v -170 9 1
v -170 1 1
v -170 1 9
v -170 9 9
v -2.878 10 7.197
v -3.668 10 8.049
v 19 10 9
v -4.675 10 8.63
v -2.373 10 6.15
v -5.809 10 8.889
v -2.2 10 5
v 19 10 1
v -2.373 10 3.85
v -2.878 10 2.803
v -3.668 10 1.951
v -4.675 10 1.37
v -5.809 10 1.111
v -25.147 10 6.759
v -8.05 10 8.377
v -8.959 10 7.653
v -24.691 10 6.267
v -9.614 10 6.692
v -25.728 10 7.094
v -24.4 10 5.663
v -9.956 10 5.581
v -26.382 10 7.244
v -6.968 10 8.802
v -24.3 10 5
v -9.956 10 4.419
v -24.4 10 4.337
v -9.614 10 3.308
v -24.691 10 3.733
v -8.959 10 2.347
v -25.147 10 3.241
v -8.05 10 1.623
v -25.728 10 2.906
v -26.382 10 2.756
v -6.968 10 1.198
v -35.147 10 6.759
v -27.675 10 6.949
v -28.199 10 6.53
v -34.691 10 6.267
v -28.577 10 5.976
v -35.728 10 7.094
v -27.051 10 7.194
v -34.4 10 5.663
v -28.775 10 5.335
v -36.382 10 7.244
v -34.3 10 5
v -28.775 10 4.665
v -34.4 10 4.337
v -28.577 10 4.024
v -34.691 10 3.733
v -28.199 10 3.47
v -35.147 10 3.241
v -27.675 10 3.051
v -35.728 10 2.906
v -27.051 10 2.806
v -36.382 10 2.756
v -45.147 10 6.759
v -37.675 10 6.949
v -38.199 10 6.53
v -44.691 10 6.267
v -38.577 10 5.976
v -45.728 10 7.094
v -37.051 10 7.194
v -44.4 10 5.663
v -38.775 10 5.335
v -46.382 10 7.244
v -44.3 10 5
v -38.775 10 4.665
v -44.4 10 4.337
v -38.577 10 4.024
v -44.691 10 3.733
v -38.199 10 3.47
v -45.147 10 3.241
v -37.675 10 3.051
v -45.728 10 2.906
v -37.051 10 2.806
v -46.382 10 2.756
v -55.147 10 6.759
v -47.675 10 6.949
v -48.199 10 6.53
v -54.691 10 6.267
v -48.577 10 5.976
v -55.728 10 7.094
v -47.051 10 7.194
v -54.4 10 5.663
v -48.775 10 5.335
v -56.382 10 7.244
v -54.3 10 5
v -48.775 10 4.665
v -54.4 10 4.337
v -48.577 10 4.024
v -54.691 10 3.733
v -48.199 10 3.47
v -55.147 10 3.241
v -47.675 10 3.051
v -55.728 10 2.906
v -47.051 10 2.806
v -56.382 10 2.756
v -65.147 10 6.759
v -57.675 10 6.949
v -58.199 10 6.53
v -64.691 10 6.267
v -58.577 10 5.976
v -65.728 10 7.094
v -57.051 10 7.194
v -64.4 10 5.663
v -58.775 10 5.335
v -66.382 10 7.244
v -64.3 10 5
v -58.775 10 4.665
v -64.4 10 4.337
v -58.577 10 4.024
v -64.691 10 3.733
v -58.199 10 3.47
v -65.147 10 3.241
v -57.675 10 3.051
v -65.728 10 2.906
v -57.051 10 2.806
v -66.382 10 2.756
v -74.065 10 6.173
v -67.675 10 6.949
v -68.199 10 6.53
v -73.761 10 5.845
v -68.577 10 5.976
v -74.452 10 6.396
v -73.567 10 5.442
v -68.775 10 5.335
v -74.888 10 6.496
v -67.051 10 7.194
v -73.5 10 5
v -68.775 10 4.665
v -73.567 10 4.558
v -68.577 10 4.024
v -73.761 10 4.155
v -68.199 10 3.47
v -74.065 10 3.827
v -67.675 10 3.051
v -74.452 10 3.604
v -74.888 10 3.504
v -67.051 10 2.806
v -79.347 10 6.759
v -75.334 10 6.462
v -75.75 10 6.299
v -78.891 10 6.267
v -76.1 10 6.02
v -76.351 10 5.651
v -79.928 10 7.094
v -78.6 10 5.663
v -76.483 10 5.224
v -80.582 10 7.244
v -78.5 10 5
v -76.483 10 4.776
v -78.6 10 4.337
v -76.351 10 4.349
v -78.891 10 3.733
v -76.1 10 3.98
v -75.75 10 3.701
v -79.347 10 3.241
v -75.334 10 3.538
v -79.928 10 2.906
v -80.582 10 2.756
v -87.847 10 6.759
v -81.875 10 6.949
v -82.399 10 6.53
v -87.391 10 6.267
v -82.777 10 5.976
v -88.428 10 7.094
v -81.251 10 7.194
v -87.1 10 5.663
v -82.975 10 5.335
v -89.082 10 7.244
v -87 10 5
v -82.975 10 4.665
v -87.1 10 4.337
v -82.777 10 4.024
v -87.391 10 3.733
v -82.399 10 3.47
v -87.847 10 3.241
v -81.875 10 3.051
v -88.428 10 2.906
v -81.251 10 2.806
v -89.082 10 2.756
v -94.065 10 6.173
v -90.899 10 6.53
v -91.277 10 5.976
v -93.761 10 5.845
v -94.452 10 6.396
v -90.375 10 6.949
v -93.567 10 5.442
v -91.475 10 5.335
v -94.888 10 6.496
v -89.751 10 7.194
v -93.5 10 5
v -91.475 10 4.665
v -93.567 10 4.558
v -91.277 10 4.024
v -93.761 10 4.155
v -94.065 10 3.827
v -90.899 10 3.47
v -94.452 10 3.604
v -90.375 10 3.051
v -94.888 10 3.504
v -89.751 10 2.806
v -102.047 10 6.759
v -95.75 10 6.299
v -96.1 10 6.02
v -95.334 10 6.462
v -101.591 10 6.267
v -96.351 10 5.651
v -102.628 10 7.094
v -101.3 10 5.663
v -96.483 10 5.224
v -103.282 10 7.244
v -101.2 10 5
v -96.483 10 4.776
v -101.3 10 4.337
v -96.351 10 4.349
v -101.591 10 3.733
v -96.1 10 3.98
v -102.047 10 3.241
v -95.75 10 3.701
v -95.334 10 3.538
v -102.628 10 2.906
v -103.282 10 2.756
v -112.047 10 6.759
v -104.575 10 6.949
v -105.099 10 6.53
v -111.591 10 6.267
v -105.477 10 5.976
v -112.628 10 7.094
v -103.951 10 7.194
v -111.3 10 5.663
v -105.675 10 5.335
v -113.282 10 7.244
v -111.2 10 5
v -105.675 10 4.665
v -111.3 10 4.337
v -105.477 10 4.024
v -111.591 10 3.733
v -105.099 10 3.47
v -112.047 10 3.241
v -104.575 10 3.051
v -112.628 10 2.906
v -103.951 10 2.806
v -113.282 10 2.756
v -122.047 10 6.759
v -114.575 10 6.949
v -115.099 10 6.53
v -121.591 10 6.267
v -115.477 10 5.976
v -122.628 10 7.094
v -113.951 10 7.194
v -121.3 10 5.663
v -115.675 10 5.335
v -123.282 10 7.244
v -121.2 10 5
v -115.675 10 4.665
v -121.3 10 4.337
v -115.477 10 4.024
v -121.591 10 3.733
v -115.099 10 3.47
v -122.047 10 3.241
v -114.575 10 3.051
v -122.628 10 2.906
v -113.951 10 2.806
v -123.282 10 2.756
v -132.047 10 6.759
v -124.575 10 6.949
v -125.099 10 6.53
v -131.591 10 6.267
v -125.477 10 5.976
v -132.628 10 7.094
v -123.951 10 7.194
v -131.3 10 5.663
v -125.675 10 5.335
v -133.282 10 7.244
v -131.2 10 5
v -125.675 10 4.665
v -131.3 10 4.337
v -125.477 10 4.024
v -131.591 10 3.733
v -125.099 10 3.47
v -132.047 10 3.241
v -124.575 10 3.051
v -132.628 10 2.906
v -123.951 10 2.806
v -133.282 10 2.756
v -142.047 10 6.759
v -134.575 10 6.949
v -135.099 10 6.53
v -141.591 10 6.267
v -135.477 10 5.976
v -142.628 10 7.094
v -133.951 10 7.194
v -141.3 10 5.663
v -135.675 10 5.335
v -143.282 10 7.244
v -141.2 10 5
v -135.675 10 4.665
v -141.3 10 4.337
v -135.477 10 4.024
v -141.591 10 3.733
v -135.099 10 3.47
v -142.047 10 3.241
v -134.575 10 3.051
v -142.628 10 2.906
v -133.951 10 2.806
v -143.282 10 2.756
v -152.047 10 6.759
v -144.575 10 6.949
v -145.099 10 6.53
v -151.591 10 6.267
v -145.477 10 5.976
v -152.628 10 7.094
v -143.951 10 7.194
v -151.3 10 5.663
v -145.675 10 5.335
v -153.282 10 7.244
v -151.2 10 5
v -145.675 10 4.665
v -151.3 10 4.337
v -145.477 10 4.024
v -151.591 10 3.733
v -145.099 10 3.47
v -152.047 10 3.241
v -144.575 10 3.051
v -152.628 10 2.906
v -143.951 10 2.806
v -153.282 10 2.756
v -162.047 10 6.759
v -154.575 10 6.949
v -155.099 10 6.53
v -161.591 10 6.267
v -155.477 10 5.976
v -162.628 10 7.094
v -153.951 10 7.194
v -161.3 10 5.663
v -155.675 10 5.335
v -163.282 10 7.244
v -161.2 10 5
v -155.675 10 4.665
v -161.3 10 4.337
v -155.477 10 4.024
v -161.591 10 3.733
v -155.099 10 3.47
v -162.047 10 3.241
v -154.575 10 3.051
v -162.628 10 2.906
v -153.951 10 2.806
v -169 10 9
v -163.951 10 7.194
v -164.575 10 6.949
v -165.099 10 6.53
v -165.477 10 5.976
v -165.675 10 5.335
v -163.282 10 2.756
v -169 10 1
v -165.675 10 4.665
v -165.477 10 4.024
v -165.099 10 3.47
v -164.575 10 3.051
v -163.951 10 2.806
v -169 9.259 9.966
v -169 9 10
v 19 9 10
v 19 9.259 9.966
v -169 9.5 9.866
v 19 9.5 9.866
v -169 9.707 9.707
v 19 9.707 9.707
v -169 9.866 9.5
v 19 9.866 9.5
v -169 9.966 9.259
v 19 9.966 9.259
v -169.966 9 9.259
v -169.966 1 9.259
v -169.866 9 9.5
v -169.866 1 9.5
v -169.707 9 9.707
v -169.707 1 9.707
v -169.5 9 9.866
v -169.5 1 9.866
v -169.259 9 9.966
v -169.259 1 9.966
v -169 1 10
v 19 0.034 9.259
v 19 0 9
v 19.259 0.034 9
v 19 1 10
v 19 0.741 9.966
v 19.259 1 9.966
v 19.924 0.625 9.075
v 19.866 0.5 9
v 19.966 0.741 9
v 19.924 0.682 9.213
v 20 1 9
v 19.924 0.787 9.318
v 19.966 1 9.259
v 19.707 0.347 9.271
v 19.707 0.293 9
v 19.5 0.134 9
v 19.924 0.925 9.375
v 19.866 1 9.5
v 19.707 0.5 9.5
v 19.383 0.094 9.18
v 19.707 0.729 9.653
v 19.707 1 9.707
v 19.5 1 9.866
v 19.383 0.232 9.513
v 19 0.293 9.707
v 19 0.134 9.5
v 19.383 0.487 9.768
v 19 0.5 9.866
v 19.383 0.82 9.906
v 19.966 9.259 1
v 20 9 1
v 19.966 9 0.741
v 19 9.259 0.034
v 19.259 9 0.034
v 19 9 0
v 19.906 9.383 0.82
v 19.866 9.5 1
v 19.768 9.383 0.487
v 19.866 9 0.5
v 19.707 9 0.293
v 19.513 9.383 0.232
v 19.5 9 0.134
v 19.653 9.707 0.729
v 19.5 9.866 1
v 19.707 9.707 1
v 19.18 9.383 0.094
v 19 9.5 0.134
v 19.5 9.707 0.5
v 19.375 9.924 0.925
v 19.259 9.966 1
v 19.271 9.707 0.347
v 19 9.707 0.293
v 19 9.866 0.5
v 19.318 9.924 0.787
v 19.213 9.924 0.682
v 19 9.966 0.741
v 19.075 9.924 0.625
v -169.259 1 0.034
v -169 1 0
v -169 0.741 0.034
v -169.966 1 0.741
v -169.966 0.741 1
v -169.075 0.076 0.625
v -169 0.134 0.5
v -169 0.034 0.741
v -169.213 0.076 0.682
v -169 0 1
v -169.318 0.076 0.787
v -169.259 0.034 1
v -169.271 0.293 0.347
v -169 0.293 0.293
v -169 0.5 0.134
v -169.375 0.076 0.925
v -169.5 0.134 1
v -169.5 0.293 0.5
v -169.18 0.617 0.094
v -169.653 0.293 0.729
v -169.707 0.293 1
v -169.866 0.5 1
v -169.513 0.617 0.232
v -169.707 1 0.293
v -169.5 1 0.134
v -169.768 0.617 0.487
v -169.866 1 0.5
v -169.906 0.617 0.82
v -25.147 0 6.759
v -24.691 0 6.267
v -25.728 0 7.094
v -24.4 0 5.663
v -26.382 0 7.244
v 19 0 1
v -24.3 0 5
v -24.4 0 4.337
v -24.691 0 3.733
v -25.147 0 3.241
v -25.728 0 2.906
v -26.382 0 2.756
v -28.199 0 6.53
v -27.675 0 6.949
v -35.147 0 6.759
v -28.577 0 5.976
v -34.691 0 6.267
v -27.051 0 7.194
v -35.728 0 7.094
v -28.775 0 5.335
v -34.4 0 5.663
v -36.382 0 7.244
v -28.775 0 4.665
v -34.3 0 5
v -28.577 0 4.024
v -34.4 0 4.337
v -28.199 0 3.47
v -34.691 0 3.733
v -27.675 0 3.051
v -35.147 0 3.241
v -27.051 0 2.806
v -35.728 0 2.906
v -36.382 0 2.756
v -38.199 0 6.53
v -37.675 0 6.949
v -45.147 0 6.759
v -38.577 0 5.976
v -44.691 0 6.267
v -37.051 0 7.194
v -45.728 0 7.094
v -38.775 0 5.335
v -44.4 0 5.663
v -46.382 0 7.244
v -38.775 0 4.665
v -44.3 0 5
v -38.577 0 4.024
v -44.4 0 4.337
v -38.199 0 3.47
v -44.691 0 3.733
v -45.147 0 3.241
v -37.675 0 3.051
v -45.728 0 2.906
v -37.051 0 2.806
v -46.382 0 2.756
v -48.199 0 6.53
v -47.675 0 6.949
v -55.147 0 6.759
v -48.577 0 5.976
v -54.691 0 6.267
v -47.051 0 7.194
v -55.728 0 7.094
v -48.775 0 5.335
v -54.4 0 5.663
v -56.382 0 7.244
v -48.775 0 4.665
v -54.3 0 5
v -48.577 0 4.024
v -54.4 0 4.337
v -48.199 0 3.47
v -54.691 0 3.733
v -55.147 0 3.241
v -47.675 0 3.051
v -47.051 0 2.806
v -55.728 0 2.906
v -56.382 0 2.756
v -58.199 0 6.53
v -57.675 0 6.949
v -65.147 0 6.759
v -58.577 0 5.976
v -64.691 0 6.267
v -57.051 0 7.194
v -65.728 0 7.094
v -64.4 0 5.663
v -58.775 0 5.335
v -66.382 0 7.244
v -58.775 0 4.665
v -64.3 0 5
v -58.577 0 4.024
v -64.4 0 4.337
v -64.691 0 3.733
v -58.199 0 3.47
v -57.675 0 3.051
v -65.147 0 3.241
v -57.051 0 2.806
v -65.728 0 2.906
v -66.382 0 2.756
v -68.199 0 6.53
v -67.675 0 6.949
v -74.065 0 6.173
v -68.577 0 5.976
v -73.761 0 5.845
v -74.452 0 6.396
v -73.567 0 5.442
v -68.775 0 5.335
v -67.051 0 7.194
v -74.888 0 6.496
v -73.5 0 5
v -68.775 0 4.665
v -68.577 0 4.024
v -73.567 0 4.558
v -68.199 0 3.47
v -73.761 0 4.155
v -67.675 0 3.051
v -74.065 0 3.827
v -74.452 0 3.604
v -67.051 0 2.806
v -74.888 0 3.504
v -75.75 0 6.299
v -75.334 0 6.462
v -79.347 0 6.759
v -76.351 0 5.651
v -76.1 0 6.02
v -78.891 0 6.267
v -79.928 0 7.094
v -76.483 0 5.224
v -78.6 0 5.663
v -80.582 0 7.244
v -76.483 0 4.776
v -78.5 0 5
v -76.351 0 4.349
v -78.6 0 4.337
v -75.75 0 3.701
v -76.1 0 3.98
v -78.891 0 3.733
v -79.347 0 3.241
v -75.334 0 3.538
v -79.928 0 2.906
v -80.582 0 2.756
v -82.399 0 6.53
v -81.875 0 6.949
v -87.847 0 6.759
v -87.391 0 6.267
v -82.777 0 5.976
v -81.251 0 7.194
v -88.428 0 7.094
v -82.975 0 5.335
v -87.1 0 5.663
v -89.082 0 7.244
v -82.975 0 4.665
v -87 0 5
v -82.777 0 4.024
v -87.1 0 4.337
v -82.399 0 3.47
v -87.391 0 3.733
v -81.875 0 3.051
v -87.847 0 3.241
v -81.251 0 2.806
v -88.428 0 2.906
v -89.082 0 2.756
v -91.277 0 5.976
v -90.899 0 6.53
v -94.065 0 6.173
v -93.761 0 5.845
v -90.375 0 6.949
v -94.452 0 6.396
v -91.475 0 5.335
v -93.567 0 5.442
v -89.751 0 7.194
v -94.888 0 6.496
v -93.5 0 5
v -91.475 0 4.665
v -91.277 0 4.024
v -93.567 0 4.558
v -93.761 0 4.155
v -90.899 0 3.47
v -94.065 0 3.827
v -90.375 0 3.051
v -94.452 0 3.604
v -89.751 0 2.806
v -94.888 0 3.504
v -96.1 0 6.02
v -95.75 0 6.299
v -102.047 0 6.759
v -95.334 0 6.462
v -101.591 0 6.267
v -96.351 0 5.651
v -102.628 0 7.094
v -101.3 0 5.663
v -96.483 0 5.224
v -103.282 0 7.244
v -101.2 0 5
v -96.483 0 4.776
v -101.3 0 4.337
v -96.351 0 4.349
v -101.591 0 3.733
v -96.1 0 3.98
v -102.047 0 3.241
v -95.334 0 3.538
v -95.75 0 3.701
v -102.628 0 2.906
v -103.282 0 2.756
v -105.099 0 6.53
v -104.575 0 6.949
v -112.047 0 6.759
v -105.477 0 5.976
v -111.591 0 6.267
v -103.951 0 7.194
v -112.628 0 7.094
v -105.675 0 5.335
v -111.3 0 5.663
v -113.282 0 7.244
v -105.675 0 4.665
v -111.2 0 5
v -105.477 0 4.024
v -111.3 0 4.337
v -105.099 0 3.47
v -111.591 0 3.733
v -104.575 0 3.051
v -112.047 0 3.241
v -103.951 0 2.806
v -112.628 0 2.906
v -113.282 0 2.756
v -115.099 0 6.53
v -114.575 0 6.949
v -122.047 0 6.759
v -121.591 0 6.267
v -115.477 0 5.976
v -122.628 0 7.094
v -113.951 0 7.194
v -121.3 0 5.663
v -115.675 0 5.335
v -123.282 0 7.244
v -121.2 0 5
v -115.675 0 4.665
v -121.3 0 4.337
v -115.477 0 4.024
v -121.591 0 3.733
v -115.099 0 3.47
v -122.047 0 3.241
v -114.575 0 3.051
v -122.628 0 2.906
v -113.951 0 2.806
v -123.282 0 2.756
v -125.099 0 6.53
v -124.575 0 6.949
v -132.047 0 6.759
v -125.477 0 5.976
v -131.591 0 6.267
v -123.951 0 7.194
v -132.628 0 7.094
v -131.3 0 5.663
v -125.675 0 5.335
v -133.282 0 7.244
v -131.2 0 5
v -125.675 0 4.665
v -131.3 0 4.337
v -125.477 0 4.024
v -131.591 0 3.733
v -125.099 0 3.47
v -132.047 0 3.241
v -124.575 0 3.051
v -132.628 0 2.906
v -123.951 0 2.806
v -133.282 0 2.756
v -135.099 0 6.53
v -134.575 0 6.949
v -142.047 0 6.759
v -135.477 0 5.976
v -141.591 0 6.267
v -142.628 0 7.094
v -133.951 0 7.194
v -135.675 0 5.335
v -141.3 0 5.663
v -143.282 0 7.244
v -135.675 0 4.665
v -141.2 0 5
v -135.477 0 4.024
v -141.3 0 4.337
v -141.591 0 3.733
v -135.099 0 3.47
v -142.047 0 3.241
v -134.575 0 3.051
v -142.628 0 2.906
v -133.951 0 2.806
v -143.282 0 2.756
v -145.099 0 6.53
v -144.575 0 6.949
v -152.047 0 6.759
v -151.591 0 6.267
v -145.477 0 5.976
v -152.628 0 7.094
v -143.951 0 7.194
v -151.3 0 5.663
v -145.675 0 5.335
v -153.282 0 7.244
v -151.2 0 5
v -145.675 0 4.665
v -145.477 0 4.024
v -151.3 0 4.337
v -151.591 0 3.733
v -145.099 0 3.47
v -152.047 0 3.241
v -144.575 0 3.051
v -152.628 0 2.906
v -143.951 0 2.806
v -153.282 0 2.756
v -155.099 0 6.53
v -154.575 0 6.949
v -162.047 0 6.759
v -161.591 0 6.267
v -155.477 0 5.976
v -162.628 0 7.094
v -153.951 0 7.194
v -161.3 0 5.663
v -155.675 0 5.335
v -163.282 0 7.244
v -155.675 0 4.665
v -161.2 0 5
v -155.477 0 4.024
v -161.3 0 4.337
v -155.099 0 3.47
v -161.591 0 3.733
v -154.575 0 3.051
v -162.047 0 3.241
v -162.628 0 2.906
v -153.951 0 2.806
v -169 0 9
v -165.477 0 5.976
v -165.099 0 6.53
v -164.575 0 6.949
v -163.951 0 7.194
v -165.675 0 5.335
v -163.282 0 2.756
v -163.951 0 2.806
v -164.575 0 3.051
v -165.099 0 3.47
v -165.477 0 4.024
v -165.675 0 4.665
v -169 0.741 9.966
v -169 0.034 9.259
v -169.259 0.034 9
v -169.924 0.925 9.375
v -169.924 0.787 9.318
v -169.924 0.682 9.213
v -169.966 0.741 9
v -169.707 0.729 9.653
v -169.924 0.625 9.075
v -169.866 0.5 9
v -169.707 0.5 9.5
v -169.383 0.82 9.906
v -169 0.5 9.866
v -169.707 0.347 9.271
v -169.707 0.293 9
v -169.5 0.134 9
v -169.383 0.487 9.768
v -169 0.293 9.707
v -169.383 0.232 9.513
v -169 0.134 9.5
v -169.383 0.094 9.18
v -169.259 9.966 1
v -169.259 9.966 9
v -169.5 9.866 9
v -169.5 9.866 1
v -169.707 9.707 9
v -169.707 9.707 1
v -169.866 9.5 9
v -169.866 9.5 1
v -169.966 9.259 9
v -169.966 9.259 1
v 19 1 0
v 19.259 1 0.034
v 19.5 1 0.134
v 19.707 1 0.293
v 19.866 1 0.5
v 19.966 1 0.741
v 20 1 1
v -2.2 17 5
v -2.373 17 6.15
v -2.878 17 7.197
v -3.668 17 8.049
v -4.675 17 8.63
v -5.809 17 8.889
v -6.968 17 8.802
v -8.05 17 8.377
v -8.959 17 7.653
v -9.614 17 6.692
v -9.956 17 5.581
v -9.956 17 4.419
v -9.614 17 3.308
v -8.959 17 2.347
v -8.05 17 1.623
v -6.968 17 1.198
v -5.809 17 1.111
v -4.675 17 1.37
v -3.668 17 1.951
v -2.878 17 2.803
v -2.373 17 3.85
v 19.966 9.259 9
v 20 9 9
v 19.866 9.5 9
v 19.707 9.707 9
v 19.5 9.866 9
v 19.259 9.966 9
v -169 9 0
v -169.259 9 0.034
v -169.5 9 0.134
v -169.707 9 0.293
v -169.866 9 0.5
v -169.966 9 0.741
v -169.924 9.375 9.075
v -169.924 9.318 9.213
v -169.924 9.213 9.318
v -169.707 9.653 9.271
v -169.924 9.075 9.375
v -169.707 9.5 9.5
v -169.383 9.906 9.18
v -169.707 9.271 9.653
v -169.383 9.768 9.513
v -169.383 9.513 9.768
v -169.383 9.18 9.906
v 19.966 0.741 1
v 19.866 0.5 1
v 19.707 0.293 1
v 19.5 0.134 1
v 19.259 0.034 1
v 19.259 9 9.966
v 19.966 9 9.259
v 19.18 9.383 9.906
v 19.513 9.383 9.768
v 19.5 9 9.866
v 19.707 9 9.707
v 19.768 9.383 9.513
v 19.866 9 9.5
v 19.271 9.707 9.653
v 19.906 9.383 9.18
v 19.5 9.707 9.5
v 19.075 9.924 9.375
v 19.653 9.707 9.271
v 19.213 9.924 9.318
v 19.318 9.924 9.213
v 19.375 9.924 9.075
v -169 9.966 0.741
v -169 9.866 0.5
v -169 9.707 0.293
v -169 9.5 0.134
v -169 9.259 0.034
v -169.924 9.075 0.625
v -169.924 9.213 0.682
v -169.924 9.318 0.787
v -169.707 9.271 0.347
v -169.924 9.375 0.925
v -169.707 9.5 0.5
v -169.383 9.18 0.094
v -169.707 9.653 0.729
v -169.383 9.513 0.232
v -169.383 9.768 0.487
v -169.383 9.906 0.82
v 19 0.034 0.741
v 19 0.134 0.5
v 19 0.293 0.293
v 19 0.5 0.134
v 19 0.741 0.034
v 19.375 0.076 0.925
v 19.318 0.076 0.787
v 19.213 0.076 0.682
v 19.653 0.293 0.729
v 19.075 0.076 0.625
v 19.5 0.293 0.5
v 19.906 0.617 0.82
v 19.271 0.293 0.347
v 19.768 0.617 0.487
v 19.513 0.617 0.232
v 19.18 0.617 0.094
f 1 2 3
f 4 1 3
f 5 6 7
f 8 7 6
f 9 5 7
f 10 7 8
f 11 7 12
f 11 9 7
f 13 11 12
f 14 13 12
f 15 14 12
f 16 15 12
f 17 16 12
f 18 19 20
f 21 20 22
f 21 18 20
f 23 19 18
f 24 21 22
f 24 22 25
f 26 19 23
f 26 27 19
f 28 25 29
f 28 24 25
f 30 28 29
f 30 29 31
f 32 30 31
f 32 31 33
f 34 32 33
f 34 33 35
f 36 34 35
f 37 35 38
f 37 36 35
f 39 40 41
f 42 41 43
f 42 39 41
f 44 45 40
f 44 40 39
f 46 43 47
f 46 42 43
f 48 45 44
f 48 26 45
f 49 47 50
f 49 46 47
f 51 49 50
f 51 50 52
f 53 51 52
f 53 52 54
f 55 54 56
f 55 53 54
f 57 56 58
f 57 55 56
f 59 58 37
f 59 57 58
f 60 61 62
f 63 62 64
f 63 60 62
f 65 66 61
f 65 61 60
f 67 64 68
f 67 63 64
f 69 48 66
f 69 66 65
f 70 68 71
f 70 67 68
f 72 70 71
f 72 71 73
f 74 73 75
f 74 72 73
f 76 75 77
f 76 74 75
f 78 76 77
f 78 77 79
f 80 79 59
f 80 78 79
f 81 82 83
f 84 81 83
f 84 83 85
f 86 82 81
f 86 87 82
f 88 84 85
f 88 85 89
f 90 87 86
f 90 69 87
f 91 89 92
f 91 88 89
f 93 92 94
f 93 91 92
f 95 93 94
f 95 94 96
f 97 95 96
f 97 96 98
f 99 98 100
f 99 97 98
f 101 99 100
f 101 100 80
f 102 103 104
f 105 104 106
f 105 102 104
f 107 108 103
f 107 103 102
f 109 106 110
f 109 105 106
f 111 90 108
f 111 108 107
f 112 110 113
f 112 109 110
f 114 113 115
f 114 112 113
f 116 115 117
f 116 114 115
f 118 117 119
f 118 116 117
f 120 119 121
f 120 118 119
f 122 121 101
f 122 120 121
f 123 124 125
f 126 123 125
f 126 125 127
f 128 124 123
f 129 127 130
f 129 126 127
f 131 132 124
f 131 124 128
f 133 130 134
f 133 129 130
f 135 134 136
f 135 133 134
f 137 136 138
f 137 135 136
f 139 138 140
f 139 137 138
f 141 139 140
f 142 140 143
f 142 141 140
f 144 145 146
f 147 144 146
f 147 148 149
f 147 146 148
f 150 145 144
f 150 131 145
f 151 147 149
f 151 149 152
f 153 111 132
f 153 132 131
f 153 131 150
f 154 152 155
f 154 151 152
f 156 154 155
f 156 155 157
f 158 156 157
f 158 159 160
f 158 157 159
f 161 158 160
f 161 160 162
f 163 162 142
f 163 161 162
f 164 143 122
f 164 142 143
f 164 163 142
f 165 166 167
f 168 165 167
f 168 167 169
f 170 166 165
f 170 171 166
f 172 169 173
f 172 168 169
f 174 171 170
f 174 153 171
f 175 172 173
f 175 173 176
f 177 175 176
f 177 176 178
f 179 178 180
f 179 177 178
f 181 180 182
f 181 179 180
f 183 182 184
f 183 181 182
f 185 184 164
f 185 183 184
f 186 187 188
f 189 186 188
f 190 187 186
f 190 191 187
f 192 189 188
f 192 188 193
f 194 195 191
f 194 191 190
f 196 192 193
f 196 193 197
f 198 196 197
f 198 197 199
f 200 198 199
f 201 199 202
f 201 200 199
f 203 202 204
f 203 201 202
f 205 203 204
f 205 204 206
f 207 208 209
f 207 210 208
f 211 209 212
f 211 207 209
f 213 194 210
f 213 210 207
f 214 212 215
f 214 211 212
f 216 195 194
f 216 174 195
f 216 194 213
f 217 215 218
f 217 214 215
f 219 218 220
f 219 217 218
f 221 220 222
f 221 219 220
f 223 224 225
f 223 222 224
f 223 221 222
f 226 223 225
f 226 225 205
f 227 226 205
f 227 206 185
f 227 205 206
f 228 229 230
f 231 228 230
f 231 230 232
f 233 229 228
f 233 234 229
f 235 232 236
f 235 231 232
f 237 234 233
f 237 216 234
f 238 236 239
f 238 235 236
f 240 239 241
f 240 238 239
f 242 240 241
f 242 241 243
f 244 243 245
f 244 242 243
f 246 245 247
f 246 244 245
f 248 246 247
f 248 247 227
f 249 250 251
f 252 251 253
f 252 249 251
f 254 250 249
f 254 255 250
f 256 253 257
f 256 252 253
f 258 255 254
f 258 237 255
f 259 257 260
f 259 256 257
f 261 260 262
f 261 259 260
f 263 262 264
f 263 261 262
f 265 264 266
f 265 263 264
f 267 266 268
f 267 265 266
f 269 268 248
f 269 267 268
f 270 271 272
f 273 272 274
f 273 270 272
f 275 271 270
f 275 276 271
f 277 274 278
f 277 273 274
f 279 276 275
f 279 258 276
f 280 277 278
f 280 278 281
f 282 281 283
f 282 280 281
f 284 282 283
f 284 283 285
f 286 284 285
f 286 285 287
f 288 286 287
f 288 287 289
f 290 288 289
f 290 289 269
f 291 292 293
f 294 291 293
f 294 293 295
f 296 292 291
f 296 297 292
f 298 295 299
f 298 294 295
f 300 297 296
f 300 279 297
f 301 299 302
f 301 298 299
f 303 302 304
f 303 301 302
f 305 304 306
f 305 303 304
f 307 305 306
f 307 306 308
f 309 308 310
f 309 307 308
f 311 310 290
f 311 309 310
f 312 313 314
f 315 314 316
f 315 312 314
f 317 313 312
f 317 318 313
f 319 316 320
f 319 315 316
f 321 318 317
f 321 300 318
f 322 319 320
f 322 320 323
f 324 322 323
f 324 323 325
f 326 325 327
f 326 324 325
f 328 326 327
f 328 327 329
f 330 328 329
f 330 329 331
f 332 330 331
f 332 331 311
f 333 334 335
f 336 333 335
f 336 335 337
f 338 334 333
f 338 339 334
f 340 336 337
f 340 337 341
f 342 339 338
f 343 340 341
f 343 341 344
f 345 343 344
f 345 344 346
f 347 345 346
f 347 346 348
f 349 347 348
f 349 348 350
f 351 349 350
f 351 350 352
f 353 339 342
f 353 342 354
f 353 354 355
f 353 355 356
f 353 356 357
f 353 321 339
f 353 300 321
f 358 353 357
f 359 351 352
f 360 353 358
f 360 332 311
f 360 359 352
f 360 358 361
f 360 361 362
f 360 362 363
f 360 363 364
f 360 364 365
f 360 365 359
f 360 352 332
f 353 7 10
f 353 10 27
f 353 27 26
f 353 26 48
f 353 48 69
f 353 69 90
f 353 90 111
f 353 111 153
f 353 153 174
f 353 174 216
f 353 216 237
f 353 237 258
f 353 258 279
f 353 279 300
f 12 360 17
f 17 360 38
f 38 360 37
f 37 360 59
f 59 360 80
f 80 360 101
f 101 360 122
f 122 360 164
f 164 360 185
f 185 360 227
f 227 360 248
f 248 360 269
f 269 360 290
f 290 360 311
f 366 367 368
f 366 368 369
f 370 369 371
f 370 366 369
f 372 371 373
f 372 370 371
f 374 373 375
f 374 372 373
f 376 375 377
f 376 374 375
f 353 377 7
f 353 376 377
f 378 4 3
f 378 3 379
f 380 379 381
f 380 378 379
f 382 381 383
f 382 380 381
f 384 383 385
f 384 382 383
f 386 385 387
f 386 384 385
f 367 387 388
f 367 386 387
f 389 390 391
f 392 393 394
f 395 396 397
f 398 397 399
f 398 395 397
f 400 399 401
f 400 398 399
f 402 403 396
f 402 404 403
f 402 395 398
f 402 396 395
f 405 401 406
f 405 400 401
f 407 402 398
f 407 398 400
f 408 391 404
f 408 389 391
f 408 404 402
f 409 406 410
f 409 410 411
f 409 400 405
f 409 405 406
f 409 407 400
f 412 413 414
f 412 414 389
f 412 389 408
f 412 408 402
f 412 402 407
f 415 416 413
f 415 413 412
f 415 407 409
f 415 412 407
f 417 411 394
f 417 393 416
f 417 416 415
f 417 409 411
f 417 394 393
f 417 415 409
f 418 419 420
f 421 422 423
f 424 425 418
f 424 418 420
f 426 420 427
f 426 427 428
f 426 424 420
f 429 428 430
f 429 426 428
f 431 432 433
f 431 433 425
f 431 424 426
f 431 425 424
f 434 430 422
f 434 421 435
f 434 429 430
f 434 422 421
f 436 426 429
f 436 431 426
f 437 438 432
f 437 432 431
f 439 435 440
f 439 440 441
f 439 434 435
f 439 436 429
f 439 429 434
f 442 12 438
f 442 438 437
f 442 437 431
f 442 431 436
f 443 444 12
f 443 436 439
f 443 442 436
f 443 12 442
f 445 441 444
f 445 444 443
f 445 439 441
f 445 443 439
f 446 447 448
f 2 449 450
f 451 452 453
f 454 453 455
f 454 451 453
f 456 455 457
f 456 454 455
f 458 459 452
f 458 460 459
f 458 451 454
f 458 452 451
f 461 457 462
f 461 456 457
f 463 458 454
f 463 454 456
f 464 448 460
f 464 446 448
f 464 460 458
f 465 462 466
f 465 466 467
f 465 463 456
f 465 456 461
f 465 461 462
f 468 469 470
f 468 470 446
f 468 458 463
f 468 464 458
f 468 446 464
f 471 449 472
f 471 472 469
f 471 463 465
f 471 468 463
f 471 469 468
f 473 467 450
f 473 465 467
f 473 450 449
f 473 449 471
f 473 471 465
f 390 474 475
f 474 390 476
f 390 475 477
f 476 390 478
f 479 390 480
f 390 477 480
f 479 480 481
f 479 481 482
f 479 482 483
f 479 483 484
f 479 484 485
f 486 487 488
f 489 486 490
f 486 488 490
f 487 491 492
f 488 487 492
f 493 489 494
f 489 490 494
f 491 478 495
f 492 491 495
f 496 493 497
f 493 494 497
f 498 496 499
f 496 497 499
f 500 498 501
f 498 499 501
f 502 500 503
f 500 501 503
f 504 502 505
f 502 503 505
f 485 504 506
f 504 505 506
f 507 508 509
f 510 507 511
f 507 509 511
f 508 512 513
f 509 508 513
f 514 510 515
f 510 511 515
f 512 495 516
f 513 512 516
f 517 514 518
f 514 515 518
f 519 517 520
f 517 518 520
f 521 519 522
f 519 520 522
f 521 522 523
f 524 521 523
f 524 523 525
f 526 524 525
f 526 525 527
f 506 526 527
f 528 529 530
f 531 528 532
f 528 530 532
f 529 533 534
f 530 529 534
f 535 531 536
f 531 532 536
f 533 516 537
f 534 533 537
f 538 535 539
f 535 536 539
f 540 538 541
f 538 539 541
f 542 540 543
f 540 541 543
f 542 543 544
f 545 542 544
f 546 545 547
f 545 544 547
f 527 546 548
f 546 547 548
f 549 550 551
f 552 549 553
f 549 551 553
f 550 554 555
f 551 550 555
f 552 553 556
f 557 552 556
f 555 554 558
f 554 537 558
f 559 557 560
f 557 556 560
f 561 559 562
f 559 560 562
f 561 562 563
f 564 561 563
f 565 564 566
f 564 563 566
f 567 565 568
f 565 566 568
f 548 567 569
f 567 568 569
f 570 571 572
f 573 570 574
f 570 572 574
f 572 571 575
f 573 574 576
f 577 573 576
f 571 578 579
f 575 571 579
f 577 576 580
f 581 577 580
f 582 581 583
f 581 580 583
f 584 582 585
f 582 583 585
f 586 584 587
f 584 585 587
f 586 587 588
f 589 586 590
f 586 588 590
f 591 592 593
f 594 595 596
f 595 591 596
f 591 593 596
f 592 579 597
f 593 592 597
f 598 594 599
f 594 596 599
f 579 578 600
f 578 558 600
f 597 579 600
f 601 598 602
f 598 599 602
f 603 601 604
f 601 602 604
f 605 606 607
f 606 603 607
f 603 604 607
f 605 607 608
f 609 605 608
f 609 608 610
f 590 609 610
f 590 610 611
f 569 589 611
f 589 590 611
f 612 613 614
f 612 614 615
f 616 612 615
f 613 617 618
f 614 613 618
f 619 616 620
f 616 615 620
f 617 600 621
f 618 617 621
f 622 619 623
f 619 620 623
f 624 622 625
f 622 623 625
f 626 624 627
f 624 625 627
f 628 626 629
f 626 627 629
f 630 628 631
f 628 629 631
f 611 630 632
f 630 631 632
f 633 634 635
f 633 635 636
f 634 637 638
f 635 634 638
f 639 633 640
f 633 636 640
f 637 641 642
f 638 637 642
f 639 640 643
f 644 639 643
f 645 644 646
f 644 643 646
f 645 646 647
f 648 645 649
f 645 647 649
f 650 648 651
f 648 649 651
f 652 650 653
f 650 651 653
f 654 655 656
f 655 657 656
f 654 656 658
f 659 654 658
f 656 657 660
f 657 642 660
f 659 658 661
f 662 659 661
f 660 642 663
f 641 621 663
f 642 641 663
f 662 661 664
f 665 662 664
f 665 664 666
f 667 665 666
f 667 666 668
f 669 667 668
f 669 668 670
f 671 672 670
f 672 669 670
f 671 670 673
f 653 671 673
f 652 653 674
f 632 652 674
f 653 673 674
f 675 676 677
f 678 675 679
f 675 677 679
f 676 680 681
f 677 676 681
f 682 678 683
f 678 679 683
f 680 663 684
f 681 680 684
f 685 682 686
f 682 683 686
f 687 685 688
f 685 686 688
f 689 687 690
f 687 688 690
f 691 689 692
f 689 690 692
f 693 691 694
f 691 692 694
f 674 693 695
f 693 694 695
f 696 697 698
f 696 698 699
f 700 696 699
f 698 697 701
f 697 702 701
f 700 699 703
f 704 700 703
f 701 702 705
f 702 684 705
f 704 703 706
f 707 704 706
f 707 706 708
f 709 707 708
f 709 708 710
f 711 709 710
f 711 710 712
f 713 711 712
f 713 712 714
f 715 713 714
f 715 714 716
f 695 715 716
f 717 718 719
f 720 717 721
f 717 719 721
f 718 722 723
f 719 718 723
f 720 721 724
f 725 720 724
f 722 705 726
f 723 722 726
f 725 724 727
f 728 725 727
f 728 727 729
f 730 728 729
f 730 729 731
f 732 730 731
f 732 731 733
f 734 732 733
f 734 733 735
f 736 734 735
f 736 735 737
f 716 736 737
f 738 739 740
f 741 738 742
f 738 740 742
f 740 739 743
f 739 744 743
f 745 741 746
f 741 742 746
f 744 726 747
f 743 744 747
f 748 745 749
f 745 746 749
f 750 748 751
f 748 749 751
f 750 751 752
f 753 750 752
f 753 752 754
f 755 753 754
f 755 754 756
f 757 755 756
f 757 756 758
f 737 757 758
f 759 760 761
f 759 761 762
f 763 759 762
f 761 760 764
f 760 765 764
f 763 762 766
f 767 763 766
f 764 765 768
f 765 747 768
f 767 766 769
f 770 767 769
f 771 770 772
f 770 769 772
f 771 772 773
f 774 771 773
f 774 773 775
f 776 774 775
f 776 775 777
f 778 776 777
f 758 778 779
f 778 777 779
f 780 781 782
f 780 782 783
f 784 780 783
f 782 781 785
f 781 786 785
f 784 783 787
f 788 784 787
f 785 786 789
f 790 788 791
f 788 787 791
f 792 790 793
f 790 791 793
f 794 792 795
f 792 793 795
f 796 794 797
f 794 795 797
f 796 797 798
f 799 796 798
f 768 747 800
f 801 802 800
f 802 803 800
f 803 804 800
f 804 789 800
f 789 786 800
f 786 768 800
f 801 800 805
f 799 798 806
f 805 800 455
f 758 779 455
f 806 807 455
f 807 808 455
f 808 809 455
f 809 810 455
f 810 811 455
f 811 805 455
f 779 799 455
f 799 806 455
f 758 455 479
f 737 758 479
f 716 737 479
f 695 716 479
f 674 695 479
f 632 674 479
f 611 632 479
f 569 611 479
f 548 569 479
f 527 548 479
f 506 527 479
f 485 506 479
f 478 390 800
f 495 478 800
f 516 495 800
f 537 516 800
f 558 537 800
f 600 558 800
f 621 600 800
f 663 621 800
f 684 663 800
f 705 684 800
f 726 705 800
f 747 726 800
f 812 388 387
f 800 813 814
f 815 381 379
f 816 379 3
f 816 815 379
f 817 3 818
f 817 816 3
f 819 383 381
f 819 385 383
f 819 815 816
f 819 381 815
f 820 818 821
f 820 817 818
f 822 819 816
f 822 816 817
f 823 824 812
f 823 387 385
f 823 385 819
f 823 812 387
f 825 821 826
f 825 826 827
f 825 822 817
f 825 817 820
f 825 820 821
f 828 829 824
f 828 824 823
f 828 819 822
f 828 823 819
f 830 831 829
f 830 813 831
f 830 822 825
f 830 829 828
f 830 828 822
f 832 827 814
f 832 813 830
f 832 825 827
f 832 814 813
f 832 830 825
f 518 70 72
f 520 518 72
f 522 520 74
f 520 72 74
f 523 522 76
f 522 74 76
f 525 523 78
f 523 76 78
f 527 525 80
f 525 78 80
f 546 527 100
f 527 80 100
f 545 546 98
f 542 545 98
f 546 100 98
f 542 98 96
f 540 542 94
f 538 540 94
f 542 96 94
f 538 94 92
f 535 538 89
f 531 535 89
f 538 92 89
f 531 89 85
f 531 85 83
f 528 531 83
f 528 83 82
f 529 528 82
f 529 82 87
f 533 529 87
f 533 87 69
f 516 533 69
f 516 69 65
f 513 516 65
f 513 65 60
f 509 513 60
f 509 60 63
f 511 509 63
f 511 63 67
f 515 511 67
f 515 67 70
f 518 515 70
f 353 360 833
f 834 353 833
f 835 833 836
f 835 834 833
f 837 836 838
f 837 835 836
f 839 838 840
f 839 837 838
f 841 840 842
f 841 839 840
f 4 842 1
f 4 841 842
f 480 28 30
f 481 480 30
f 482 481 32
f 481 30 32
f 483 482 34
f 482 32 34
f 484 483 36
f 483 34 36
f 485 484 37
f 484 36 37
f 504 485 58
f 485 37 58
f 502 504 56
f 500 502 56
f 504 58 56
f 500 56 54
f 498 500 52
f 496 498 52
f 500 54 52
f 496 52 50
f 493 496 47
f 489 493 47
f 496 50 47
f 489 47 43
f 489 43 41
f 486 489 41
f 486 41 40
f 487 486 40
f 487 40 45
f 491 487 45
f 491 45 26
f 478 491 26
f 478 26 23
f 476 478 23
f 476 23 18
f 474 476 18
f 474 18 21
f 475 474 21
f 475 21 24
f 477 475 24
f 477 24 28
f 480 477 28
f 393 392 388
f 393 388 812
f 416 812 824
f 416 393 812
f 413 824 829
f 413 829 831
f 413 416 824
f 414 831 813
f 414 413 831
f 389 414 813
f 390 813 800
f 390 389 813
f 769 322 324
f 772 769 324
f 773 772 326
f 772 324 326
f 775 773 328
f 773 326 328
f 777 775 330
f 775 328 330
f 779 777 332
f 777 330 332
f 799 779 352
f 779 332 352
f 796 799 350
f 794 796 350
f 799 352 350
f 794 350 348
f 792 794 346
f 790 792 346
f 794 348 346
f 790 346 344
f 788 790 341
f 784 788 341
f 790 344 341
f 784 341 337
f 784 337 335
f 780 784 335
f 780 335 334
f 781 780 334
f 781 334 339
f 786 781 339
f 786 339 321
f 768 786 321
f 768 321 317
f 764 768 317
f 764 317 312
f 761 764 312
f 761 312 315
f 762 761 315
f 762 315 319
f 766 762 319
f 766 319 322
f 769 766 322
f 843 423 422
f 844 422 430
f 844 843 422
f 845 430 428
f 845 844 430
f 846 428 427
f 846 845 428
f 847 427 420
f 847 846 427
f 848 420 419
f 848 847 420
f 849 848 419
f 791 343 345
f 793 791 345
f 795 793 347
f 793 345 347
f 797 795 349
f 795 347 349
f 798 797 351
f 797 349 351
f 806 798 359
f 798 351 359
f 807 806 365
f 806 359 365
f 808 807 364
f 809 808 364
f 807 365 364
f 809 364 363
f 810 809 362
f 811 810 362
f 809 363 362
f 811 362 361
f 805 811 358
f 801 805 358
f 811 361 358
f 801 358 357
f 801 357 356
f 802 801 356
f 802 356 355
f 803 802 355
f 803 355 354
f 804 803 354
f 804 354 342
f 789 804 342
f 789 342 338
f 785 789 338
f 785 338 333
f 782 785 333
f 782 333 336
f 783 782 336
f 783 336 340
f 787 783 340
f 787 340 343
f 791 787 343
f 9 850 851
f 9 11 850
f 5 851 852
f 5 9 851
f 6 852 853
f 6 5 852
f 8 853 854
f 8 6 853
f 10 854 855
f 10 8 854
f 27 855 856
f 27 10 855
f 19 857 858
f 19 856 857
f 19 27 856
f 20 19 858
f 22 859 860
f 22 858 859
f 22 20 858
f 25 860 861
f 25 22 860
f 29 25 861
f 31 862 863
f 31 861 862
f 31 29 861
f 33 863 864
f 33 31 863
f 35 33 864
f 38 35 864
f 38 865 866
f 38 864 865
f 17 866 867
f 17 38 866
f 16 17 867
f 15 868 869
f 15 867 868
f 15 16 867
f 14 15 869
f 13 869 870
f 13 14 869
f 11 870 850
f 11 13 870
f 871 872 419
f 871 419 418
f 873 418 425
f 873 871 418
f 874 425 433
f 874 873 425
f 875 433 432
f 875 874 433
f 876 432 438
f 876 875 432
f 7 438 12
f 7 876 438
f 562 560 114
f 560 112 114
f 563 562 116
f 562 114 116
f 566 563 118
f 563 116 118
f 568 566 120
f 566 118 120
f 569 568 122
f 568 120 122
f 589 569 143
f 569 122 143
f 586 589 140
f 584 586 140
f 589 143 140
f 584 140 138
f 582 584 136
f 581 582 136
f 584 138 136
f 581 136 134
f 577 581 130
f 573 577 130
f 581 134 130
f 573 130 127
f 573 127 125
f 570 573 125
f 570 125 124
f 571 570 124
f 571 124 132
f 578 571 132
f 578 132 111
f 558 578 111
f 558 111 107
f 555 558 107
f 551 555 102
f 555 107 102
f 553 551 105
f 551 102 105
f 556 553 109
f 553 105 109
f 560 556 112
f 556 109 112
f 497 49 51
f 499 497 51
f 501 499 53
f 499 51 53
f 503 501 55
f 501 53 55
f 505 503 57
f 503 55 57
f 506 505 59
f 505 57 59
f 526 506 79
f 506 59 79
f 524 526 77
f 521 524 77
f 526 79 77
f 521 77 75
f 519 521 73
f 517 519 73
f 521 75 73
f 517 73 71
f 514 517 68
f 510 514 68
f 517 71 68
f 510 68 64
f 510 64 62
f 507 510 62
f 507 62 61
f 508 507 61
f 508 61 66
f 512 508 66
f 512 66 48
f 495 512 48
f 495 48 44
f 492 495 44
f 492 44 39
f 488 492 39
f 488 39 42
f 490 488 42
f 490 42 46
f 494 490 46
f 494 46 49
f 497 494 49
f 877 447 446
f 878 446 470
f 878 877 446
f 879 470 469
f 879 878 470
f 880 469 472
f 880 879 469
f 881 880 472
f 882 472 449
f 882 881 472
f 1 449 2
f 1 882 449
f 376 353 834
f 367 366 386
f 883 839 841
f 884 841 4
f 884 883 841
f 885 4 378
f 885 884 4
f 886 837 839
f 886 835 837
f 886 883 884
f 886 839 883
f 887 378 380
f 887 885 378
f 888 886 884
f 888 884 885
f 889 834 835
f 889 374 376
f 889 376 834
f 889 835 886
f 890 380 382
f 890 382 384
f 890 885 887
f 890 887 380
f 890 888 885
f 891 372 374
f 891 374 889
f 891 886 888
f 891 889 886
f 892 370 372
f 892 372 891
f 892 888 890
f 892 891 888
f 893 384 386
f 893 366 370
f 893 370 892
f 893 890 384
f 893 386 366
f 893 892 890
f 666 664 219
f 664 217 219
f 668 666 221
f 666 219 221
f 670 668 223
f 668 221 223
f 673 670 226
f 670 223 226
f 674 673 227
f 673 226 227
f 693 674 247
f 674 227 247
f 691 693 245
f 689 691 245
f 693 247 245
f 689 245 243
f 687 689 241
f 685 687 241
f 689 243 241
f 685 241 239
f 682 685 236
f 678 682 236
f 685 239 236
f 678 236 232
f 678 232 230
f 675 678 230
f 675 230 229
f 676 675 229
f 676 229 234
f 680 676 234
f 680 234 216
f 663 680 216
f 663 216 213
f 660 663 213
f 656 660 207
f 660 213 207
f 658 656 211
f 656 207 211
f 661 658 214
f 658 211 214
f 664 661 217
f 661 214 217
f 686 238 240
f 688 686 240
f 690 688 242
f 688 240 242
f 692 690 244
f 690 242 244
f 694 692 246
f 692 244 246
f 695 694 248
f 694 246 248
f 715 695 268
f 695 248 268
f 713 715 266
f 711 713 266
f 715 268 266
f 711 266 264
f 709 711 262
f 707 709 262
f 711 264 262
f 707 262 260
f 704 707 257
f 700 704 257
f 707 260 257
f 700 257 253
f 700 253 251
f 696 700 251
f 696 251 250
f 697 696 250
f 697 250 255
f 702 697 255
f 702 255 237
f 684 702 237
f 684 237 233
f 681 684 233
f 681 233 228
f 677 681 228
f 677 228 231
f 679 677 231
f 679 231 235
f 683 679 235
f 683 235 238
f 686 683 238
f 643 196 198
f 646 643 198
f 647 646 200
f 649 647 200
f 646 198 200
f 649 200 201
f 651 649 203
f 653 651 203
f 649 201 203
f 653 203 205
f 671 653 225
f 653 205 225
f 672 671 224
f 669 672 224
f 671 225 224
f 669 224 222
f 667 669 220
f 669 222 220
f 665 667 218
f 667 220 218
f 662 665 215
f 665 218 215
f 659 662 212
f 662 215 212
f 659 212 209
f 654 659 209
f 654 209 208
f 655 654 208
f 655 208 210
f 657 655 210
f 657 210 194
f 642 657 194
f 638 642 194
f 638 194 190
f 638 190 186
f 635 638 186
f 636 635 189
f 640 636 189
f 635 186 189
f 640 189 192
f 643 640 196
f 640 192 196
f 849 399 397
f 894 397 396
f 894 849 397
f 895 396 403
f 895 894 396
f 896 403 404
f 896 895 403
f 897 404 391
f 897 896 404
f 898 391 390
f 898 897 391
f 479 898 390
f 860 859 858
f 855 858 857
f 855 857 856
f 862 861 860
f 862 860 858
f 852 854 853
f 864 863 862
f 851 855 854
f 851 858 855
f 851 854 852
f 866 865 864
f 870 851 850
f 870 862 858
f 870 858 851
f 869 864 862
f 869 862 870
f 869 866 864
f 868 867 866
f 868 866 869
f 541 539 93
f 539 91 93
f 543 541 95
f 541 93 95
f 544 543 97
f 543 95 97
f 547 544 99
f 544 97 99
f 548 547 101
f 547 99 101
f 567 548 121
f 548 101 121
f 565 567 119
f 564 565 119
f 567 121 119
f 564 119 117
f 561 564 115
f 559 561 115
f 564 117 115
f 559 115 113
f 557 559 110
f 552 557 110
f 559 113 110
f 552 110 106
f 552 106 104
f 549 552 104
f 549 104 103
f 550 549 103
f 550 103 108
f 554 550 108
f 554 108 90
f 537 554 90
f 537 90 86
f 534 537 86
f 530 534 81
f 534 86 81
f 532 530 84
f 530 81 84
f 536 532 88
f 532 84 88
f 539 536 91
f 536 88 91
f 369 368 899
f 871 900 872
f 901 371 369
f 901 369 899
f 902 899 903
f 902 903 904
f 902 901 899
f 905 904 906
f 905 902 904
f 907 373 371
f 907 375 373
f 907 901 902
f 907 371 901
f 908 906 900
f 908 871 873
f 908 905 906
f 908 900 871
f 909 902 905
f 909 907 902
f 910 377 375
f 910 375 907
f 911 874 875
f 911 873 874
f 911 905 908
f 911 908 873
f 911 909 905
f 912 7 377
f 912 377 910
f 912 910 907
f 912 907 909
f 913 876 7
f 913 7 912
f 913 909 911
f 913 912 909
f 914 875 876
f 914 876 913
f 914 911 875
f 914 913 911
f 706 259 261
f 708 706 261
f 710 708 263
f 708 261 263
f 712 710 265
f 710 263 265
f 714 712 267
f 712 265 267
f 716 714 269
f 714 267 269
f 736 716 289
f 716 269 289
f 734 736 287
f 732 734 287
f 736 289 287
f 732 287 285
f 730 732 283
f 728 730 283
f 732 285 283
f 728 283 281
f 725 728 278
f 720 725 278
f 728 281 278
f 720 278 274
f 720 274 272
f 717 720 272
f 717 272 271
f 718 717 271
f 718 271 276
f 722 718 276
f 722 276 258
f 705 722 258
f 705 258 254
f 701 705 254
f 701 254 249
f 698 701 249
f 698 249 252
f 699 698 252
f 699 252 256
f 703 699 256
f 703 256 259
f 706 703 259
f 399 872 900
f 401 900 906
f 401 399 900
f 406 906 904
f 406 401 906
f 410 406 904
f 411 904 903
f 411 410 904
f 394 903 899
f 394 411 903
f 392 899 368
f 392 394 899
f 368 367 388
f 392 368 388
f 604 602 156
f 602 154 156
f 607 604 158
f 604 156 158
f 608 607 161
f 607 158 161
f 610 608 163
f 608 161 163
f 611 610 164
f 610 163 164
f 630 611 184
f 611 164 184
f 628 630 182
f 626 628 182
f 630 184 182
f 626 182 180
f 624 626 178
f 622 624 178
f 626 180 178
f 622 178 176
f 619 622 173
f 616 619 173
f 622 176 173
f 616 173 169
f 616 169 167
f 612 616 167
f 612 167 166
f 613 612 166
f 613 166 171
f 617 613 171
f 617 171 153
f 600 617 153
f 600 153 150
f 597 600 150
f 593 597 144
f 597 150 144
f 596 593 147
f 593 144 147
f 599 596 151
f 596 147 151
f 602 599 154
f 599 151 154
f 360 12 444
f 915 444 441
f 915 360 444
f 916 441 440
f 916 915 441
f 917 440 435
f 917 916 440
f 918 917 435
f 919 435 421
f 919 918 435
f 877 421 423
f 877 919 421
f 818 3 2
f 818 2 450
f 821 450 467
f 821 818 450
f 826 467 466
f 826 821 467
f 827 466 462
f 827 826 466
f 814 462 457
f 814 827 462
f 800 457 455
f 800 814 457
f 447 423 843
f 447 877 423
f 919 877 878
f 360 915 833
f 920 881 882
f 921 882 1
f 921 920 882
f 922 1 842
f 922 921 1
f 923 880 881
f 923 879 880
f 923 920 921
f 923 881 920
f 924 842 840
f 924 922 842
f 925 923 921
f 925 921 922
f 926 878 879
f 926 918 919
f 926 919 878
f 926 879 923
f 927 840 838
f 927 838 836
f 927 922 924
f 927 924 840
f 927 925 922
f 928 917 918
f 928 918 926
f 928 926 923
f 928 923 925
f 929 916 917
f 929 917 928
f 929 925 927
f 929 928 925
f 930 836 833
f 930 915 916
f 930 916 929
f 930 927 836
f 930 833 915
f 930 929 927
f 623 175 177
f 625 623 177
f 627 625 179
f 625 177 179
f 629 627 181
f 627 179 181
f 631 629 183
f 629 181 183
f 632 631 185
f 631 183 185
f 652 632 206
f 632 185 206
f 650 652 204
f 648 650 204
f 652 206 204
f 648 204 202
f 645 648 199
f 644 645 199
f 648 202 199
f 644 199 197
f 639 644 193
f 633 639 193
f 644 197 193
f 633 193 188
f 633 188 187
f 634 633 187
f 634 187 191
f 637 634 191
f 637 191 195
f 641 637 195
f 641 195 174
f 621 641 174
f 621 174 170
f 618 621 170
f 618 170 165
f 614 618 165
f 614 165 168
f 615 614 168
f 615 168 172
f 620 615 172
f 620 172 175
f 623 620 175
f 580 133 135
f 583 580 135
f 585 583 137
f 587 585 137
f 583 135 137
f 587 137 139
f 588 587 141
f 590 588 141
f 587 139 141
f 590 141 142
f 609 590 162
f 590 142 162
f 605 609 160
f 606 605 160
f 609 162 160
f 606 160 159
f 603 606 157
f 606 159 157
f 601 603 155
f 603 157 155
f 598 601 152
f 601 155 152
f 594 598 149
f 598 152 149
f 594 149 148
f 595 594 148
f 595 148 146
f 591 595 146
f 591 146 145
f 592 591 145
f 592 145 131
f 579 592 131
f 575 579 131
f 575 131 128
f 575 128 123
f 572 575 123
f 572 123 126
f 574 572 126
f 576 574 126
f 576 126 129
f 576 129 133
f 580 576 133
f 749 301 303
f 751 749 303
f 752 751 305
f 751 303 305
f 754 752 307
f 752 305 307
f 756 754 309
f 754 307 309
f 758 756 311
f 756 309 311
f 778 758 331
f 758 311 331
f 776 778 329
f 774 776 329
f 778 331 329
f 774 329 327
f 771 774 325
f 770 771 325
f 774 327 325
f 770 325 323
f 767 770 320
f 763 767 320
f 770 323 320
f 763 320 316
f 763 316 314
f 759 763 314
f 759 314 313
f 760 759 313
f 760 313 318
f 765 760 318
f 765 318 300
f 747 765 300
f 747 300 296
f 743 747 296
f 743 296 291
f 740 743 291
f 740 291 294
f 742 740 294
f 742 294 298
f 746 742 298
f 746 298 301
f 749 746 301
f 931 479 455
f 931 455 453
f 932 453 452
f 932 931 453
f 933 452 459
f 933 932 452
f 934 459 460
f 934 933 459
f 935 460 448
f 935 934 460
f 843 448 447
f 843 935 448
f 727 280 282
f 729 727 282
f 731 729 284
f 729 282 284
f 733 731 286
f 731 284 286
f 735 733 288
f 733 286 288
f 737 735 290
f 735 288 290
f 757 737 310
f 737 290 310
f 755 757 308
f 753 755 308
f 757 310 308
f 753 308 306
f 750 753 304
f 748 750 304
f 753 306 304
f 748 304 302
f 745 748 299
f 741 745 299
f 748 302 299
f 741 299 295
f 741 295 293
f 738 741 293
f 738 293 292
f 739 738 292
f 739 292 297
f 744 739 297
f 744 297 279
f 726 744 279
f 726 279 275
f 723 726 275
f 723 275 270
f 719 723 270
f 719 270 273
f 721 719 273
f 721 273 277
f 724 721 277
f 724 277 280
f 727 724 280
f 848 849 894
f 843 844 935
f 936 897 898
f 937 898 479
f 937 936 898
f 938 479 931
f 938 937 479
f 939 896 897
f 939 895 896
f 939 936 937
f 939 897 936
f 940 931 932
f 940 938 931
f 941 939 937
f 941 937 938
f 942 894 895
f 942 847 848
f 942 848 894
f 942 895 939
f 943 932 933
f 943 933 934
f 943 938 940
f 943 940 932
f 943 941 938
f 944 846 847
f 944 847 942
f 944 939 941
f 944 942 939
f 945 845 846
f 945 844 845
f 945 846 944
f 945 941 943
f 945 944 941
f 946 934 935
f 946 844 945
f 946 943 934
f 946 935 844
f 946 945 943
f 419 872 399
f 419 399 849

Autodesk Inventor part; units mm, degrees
ref_plane "YZ Plane" through (0, 0, 0) normal (1, 0, 0) x (0, 1, 0)
ref_plane "XZ Plane" through (0, 0, 0) normal (0, 1, 0) x (-1, 0, 0)
ref_plane "XY Plane" through (0, 0, 0) normal (0, 0, 1) x (1, 0, 0)
sketch "Sketch1" plane through (0, 0, 0) normal (0, 1, 0) x (-1, 0, 0)
  line L0 (0, 0) -> (170, 0)
  line L1 (170, 0) -> (170, 10)
  line L2 (170, 10) -> (0, 10)
  line L3 (0, 10) -> (0, 0)
  dimension "d0" = 170
  dimension "d1" = 10
extrude "Extrusion1" add sketch "Sketch1" along normal blind 10
sketch "Sketch2" plane through (0, 10, 0) normal (0, 1, 0) x (1, 0, 0)
  line L0 (0, -10) -> (0, 0) projected
  line L1 (0, -5) -> (-2.2, -5)
  circle A0 centre (-6.1, -5) radius 3.9
  line L2 (0, 0) -> (-170, 0) projected
  line L3 (-170, -10) -> (0, -10) projected
  circle A1 centre (-75, -5) radius 1.5
  circle A2 centre (-95, -5) radius 1.5
  dimension "d35" = 10
  dimension "d4" = 2.2
  dimension "d8" = 3
  dimension "d9" = 3
extrude "Extrusion2" cut sketch "Sketch2" against normal blind 10 contours A1
extrude "Extrusion3" cut sketch "Sketch2" against normal blind 10 contours A2
extrude "Extrusion4" add sketch "Sketch2" along normal blind 7 contours A0
sketch "Sketch3" plane through (0, 10, 0) normal (0, 1, 0) x (1, 0, 0)
  line L0 (-170, 0) -> (-170, -10) projected
  line L1 (-170, -5) -> (-10, -5)
  circle A0 centre (-6.1, -5) radius 3.9 projected
  line L2 (-165.7, -5) -> (-163.45, -5)
  circle A1 centre (-163.45, -5) radius 2.25
  circle A2 centre (-153.45, -5) radius 2.25
  circle A3 centre (-143.45, -5) radius 2.25
  circle A4 centre (-133.45, -5) radius 2.25
  circle A5 centre (-123.45, -5) radius 2.25
  circle A6 centre (-113.45, -5) radius 2.25
  circle A7 centre (-103.45, -5) radius 2.25
  circle A8 centre (-95, -5) radius 1.5 projected
  line L3 (-93.5, -5) -> (-93.5, -7.9104)
  circle A9 centre (-75, -5) radius 1.5 projected
  line L4 (-76.5, -5) -> (-76.5, -7.25)
  line L5 (-93.5, -5) -> (-76.5, -5)
  line L6 (-85, -5) -> (-93.5, -5)
  line L7 (-85, -5) -> (-76.5, -5)
  circle A10 centre (-80.75, -5) radius 2.25
  circle A11 centre (-89.25, -5) radius 2.25
  line L8 (-10, -5) -> (-12, -5)
  line L9 (-10, -5) -> (-14.3, -5)
  line L10 (-14.3, -5) -> (-16.55, -5)
  circle A12 centre (-16.55, -5) radius 2.25
  circle A13 centre (-26.55, -5) radius 2.25
  circle A14 centre (-36.55, -5) radius 2.25
  circle A15 centre (-46.55, -5) radius 2.25
  circle A16 centre (-56.55, -5) radius 2.25
  circle A17 centre (-66.55, -5) radius 2.25
  point P0 (0, 0)
  point P1 (-155.7, -5)
  point P2 (-145.7, -5)
  point P3 (-135.7, -5)
  point P4 (-125.7, -5)
  point P5 (-115.7, -5)
  point P6 (-105.7, -5)
  point P7 (-24.3, -5)
  point P8 (-34.3, -5)
  point P9 (-44.3, -5)
  point P10 (-54.3, -5)
  point P11 (-64.3, -5)
  dimension "d20" = 10
  dimension "d32" = 10
extrude "Extrusion5" cut sketch "Sketch3" against normal blind 10 contours A1 L1 | L1 A1 | L1 A12 | L1 A12 | A2 L1 | L1 A2 | A3 L1 | L1 A3 | A4 L1 | L1 A4 | A5 L1 | L1 A5 | A6 L1 | L1 A6 | A7 L1 | L1 A7 | A11 L1 | L1 A11 | A10 L1 | L1 A10 | A17 L1 | L1 A17 | A16 L1 | L1 A16 | A15 L1 | L1 A15 | A14 L1 | L1 A14 | A13 L1 | L1 A13
thread "Thread1" size "M3x0.5" class "6H" standard "ANSI Metric M Profile" full length
thread "Thread2" size "M3x0.5" class "6H" standard "ANSI Metric M Profile" full length
sketch "Sketch4" plane through (0, 10, 0) normal (0, 1, 0) x (1, 0, 0)
  circle A0 centre (-16.55, -5) radius 2.25 projected
  circle A1 centre (-16.55, -5) radius 2.25
  point P0 (0, 0)
extrude "Extrusion6" add sketch "Sketch4" against normal blind 10
sketch "Sketch5" plane through (0, 0, 10) normal (1, 0, 0) x (0, 0, -1)
  line L0 (10, 0) -> (0, 0) projected
  line L1 (0, 0) -> (0, 10) projected
  line L2 (10, 0) -> (0, 0)
  line L3 (0, 0) -> (0, 10)
  line L4 (0, 10) -> (10, 10)
  line L5 (10, 10) -> (10, 0)
extrude "Extrusion7" add sketch "Sketch5" along normal blind 10
sketch "Sketch6" plane through (10, 0, 10) normal (1, 0, 0) x (0, 0, -1)
  line L0 (0, 0) -> (10, 0) projected
  line L1 (0, 10) -> (0, 0) projected
  line L2 (10, 0) -> (0, 0)
  line L3 (0, 0) -> (0, 10)
  line L4 (0, 10) -> (10, 10)
  line L5 (10, 10) -> (10, 0)
extrude "Extrusion8" add sketch "Sketch6" along normal blind 10
sketch "Sketch7" plane through (0, 10, 0) normal (0, 1, 0) x (1, 0, 0)
  point P0 (0, 0)
fillet "Fillet3" radius 1 11 edges at (-75, 10, 10) (-75, 0, 10) (-75, 10, 0) (20, 5, 10) (20, 5, 0) (20, 0, 5) (-170, 10, 5) (-170, 5, 10) (-170, 5, 0) (-170, 0, 5) (-75, 0, 0)
fillet "Fillet4" radius 1 3 edges at (19.7071, 9.7071, 9.7071) (19.7071, 9.7071, 0.2929) (20, 10, 5)
properties part number "brazo apoyo"
